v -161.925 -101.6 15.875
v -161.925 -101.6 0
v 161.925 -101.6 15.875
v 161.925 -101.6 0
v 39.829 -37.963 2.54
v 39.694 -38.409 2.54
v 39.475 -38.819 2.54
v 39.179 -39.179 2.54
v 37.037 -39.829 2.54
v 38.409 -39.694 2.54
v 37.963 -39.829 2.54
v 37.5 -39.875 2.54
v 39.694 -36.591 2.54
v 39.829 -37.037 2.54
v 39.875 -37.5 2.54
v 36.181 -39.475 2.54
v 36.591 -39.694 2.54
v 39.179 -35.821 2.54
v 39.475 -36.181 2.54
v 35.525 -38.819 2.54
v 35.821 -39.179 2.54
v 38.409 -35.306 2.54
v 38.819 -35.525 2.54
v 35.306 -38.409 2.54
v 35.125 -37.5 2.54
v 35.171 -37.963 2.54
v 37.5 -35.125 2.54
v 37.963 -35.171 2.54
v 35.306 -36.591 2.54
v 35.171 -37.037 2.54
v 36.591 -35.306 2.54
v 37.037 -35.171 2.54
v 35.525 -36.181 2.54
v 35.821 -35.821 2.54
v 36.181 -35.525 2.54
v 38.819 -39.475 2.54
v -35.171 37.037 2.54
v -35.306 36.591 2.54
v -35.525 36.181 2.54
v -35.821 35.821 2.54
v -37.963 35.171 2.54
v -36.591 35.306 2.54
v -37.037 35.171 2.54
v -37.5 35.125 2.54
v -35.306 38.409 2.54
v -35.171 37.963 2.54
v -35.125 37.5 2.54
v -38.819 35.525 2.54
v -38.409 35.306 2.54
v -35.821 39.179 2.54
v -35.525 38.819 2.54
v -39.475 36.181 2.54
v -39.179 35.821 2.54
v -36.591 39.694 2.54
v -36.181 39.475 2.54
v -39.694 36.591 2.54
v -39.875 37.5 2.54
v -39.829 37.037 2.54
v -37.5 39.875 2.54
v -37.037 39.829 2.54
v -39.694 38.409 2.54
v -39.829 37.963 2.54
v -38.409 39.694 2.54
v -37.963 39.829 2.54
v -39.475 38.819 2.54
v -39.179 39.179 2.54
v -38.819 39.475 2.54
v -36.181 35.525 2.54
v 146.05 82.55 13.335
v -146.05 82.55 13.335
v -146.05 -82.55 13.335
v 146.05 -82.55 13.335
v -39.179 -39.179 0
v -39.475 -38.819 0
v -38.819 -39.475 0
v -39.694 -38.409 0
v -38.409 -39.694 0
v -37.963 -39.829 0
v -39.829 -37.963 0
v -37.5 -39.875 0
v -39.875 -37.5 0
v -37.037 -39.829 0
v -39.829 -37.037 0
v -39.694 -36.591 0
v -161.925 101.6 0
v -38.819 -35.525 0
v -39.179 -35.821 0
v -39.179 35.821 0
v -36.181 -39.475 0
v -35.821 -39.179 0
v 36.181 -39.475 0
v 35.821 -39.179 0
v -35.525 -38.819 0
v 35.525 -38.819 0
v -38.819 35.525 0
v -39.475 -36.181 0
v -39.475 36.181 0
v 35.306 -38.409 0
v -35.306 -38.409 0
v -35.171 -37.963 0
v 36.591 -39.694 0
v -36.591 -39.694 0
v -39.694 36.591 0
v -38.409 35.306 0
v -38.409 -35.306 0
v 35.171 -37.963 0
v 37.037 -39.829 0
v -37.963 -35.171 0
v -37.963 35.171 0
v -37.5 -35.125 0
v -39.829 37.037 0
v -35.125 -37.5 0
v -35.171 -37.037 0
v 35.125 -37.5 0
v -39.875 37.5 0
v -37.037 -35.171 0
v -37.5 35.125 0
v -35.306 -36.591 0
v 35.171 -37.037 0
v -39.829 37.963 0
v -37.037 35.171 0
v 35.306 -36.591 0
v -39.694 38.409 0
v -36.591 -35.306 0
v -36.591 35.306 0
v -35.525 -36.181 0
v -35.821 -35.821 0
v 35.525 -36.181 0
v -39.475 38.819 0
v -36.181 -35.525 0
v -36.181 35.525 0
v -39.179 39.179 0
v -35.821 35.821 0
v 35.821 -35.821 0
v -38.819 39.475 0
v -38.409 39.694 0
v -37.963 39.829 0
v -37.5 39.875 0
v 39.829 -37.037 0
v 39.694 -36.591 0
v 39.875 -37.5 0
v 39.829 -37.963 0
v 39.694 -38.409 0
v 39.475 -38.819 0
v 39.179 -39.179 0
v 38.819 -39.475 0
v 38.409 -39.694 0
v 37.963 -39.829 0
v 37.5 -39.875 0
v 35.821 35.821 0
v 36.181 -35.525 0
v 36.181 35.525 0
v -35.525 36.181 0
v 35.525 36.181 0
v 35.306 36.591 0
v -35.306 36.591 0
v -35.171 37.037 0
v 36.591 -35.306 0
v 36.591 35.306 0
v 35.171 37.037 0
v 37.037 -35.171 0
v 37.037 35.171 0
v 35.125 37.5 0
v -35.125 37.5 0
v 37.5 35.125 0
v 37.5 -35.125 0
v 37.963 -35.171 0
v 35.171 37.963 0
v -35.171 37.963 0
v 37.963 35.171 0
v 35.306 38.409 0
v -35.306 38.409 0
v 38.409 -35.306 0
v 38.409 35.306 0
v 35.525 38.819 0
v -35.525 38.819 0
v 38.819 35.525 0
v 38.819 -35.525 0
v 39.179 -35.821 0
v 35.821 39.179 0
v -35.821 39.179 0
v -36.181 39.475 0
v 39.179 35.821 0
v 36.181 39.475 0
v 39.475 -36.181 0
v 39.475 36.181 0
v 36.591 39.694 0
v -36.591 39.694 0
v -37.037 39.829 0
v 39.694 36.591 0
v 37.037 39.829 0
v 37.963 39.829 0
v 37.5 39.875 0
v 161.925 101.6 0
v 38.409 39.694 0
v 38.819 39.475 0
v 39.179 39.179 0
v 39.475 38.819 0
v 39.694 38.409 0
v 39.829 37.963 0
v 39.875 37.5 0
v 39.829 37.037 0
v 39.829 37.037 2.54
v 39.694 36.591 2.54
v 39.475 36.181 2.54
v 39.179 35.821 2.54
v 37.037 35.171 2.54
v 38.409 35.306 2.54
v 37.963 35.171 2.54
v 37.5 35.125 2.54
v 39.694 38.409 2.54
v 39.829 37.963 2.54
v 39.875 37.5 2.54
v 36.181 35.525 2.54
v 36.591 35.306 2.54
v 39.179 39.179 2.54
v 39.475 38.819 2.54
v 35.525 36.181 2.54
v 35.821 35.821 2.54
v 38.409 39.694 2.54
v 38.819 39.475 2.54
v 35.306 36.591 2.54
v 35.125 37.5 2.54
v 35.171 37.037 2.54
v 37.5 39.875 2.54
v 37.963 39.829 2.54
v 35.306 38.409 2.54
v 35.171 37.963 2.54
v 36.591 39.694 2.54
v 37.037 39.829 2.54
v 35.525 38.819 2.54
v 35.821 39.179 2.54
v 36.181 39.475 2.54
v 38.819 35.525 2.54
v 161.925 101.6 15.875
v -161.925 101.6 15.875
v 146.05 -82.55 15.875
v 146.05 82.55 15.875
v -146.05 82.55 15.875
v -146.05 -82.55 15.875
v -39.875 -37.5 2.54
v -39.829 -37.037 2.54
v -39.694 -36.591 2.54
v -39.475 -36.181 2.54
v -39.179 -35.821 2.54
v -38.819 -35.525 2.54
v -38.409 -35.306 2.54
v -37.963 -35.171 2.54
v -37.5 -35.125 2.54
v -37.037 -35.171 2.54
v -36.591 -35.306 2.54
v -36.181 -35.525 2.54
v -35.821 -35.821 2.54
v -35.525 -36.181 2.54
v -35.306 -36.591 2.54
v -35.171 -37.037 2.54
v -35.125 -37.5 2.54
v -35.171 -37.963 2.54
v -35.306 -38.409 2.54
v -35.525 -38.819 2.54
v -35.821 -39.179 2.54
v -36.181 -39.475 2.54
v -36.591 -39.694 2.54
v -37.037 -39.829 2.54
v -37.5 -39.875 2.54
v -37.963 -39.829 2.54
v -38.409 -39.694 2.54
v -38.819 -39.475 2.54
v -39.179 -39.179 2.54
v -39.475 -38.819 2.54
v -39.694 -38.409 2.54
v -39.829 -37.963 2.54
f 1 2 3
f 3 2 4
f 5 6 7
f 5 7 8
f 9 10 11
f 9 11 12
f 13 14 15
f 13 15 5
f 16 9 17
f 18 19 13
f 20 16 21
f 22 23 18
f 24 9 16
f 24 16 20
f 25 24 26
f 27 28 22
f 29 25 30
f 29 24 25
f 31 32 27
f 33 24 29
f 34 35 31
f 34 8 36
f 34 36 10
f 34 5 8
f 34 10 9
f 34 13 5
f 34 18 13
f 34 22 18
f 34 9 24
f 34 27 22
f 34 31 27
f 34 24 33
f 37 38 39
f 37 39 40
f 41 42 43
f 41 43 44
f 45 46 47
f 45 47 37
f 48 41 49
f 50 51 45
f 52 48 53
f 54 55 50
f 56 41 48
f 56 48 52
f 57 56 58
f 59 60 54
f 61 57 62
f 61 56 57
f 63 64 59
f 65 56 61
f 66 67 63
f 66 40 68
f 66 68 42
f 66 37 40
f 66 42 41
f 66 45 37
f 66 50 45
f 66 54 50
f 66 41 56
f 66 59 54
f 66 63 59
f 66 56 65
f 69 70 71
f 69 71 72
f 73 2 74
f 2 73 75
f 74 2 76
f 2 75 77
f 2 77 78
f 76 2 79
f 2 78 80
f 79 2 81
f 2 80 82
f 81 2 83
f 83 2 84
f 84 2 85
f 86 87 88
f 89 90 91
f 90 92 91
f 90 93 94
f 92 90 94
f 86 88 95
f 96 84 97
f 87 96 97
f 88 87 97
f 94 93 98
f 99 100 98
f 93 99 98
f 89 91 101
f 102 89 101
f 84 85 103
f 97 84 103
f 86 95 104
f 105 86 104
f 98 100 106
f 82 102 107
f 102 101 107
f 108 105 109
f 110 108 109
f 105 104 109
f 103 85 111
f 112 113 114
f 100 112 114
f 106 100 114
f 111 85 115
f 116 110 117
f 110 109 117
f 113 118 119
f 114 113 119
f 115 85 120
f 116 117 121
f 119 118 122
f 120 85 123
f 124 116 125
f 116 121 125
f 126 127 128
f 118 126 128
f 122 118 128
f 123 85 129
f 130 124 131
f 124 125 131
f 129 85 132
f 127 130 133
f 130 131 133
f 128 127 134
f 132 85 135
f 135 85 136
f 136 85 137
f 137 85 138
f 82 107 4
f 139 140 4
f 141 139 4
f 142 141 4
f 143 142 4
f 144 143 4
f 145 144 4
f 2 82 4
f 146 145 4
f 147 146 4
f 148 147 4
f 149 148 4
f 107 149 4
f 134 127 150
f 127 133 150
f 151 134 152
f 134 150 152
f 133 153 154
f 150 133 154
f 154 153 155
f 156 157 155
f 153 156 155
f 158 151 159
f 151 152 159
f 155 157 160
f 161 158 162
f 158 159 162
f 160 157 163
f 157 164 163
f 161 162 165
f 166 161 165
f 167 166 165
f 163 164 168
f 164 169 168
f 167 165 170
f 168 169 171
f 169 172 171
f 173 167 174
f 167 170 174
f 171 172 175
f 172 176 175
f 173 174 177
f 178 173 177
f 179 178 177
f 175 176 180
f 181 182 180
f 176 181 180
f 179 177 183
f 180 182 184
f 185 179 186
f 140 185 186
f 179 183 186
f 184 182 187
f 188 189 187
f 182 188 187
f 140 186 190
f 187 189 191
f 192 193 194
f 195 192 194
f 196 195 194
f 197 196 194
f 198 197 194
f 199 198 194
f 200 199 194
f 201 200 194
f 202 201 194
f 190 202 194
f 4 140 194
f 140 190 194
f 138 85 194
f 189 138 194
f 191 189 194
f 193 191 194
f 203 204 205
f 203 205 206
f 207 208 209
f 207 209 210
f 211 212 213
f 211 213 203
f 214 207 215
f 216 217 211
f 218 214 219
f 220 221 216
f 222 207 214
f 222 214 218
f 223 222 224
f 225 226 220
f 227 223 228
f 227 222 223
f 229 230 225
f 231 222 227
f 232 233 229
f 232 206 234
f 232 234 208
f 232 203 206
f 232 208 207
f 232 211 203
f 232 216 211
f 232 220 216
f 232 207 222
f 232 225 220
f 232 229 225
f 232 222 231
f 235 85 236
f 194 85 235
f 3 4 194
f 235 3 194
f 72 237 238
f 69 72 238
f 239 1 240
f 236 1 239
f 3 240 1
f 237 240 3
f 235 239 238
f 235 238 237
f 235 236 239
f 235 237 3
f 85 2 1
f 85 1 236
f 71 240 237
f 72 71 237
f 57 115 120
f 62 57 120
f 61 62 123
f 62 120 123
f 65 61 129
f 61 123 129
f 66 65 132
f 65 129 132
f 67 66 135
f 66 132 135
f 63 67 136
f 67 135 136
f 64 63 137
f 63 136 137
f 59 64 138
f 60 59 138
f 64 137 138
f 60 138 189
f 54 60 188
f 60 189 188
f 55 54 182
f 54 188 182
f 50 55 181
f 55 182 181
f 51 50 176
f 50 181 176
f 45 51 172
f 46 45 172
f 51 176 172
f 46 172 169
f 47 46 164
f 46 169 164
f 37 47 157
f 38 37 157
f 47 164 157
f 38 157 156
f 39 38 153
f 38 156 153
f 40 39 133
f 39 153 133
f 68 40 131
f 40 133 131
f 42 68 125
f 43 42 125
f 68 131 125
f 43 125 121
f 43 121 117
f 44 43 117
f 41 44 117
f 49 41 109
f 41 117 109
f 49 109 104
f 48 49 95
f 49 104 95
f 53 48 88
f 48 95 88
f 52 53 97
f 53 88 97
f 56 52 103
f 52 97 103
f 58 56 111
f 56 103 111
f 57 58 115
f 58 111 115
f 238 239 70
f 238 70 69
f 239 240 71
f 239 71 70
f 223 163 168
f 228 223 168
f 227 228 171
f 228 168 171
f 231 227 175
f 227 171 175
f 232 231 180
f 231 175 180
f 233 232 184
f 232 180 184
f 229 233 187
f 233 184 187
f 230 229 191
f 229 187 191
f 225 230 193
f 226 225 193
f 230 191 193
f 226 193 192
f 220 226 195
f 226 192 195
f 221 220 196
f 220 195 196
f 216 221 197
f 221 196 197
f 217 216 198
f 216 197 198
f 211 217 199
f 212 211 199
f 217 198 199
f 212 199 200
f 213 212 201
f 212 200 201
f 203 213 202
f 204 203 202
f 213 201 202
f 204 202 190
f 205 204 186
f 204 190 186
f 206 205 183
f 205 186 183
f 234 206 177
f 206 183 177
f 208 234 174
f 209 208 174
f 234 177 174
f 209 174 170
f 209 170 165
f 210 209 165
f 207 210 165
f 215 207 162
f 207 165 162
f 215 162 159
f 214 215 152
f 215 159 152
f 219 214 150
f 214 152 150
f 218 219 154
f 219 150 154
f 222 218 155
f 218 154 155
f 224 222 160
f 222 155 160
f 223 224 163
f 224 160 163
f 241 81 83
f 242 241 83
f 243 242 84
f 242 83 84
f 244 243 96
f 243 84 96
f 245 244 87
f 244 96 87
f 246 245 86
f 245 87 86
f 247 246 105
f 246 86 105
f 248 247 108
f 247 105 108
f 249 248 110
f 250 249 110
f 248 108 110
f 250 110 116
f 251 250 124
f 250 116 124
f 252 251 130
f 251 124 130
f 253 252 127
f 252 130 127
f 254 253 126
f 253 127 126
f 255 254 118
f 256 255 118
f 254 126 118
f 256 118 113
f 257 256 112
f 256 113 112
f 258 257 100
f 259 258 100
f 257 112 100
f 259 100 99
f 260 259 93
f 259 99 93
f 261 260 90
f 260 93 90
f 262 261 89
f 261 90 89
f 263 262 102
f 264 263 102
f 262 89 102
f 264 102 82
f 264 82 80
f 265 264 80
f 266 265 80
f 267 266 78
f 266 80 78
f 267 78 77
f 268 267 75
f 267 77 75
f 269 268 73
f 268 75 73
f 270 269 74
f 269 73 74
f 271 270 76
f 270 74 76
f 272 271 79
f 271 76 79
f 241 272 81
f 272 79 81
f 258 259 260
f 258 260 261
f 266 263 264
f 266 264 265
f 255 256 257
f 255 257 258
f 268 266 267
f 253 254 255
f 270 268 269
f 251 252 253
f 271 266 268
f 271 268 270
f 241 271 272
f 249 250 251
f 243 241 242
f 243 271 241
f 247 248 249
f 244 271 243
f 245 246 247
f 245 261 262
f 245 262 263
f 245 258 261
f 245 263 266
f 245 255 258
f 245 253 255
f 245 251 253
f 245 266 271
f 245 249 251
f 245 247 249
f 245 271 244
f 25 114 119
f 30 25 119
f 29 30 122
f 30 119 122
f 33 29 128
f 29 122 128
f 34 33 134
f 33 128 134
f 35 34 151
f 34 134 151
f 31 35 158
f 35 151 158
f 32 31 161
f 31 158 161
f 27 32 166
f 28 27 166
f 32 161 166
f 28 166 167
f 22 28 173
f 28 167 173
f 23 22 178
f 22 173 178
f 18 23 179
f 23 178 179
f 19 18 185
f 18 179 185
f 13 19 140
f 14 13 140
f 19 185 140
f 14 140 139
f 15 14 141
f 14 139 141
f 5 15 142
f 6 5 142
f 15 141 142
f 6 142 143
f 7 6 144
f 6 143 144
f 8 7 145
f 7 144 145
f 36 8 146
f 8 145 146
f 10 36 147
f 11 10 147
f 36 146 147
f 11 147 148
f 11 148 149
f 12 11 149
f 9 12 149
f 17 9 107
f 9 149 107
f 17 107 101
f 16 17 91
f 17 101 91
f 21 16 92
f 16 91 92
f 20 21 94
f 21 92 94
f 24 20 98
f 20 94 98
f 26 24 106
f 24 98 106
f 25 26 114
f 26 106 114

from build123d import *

# Parameters (mm, degrees)
SKETCH1_W           = 323.85
SKETCH1_H           = 203.2
BOSS_EXTRUDE1_DEPTH = 15.875
SKETCH2_W           = 292.1
SKETCH2_H           = 165.1
CUT_EXTRUDE1_DEPTH  = 2.54
SKETCH3_R           = 2.3749
CUT_EXTRUDE2_DEPTH  = 2.54


with BuildPart() as part:
    # Sketch1 → Boss-Extrude1 (new body)
    with BuildSketch(Plane.XY):
        Rectangle(SKETCH1_W, SKETCH1_H)
    extrude(amount=BOSS_EXTRUDE1_DEPTH)

    # Sketch2 → Cut-Extrude1 (cut)
    with BuildSketch(Plane.XY.offset(15.875)):
        Rectangle(SKETCH2_W, SKETCH2_H)
    extrude(amount=-CUT_EXTRUDE1_DEPTH, mode=Mode.SUBTRACT)

    # Sketch3 → Cut-Extrude2 (cut)
    with BuildSketch(Plane(origin=(0, 0, 0), x_dir=(-1, 0, 0), z_dir=(0, 0, -1))):
        with Locations((-37.5, 37.5)):
            Circle(SKETCH3_R)
        with Locations((37.5, 37.5)):
            Circle(SKETCH3_R)
        with Locations((37.5, -37.5)):
            Circle(SKETCH3_R)
        with Locations((-37.5, -37.5)):
            Circle(SKETCH3_R)
    extrude(amount=-CUT_EXTRUDE2_DEPTH, mode=Mode.SUBTRACT)


solid = part.part
